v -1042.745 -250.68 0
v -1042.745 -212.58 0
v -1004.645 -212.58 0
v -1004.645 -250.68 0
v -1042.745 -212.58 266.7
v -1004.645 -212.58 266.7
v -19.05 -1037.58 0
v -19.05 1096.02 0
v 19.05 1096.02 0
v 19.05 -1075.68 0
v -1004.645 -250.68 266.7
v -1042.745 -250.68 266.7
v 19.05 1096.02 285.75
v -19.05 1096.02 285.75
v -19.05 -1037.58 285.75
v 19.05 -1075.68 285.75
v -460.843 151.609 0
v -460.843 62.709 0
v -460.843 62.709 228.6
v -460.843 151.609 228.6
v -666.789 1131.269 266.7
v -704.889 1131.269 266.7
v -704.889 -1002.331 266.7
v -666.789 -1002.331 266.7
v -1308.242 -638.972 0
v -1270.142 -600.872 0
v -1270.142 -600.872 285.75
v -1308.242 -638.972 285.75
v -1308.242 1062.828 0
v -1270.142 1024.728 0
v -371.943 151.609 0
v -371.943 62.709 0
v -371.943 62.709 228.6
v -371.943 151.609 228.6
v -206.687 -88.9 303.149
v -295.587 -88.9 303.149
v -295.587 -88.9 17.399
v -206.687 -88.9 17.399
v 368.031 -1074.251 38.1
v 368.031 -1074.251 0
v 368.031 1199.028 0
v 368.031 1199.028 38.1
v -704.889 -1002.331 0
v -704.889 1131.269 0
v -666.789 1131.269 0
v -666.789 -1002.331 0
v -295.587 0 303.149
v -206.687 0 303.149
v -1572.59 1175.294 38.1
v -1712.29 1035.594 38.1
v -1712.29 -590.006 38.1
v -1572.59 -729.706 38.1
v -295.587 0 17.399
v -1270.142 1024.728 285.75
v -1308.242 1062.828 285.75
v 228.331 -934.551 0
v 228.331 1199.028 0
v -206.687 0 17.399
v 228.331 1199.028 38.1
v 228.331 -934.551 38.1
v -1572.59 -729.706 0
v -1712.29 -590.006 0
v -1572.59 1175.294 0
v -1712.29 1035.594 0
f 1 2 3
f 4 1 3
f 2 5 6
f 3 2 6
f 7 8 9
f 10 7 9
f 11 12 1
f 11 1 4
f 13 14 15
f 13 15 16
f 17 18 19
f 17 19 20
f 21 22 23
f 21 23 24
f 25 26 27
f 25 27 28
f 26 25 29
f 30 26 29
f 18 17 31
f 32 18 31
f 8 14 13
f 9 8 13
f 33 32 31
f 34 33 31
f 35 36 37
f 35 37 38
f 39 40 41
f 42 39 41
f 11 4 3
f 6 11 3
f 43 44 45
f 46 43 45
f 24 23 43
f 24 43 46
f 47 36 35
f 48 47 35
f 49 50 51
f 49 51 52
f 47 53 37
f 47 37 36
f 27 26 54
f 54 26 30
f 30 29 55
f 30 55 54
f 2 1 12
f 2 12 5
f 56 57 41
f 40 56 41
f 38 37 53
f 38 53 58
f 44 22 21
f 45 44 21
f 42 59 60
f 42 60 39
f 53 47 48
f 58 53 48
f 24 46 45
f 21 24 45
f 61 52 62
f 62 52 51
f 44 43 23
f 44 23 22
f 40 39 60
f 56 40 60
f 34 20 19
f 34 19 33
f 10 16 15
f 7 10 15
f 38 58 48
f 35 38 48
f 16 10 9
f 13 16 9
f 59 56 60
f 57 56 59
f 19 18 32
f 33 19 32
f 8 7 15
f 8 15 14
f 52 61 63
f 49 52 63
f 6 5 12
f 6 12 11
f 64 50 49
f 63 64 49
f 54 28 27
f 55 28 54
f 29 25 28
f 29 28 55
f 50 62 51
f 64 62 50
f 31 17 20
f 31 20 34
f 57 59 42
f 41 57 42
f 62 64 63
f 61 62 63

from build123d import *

# Parameters (mm, degrees)
F0_W      = 38.1
F0_H      = 2209.8
F1_DEPTH  = 285.75
F3_DEPTH  = 285.751
F4_W      = 38.1
F4_H      = 1701.8
F5_DEPTH  = 285.75
F7_DEPTH  = 285.751
F9_DEPTH  = 285.751
F10_W     = 38.1
F10_H     = 2133.6
F11_DEPTH = 266.7
F12_W     = 38.1
F12_H     = 38.1
F13_DEPTH = 266.7
F14_W     = 88.9
F14_H     = 88.9
F15_DEPTH = 228.6
F16_W     = 139.7
F16_H     = 2311.4
F17_DEPTH = 38.1
F19_DEPTH = 38.101
F20_W     = 139.7
F20_H     = 1905
F21_DEPTH = 38.1
F23_DEPTH = 38.101
F25_DEPTH = 38.101
F26_W     = 88.9
F26_H     = 285.75
F27_DEPTH = 88.9
F29_DEPTH = 285.751
F31_DEPTH = 285.751
F32_W     = 139.7
F32_H     = 38.121408
F33_DEPTH = 38.101


with BuildPart() as f1:
    # F0 (on Top) → F1 (new body)
    with BuildSketch(Plane.XY):
        with Locations((0, 29.220348)):
            Rectangle(F0_W, F0_H)
    extrude(amount=F1_DEPTH)

    # F2 (on face) → F3 (cut, through all)
    with BuildSketch(Plane.XY.offset(285.75)):
        Polygon((-19.05, -1075.679652), (19.05, -1075.679652), (-19.05, -1037.579652), align=None)
    extrude(amount=-F3_DEPTH, mode=Mode.SUBTRACT)

    # F28 (on face) → F29 (cut, through all)
    with BuildSketch(Plane.XY.offset(285.75)):
        Polygon((19.05, 1134.120348), (-19.05, 1134.120348), (-19.05, 1096.020348), align=None)
    extrude(amount=-F29_DEPTH, mode=Mode.SUBTRACT)

    # F30 (on face) → F31 (cut, through all)
    with BuildSketch(Plane.XY.offset(285.75)):
        Polygon((19.05, 1096.020348), (19.05, 1134.120348), (-19.05, 1096.020348), align=None)
    extrude(amount=-F31_DEPTH, mode=Mode.SUBTRACT)


with BuildPart() as f5:
    # F4 (on Top) → F5 (new body)
    with BuildSketch(Plane.XY):
        with Locations((-1289.192454, 211.927569)):
            Rectangle(F4_W, F4_H)
    extrude(amount=F5_DEPTH)

    # F6 (on face) → F7 (cut, through all)
    with BuildSketch(Plane.XY.offset(285.75)):
        Polygon((-1270.142454, 1024.727569), (-1270.142454, 1062.827569), (-1308.242454, 1062.827569), align=None)
    extrude(amount=-F7_DEPTH, mode=Mode.SUBTRACT)

    # F8 (on face) → F9 (cut, through all)
    with BuildSketch(Plane.XY.offset(285.75)):
        Polygon((-1270.142454, -600.872431), (-1308.242454, -638.972431), (-1270.142454, -638.972431), align=None)
    extrude(amount=-F9_DEPTH, mode=Mode.SUBTRACT)


with BuildPart() as f11:
    # F10 (on Top) → F11 (new body)
    with BuildSketch(Plane.XY):
        with Locations((-685.839234, 64.468862)):
            Rectangle(F10_W, F10_H)
    extrude(amount=F11_DEPTH)


with BuildPart() as f13:
    # F12 (on Top) → F13 (new body)
    with BuildSketch(Plane.XY):
        with Locations((-1023.695287, -231.63034)):
            Rectangle(F12_W, F12_H)
    extrude(amount=F13_DEPTH)


with BuildPart() as f15:
    # F14 (on Top) → F15 (new body)
    with BuildSketch(Plane.XY):
        with Locations((-416.393369, 107.158791)):
            Rectangle(F14_W, F14_H)
    extrude(amount=F15_DEPTH)


with BuildPart() as f17:
    # F16 (on Top) → F17 (new body)
    with BuildSketch(Plane.XY):
        with Locations((298.18053, 81.449066)):
            Rectangle(F16_W, F16_H)
    extrude(amount=F17_DEPTH)

    # F18 (on face) → F19 (cut, through all)
    with BuildSketch(Plane.XY.offset(38.1)):
        Polygon((228.33053, -934.550934), (228.33053, -1074.250934), (368.03053, -1074.250934), align=None)
    extrude(amount=-F19_DEPTH, mode=Mode.SUBTRACT)

    # F32 (on face) → F33 (cut, through all)
    with BuildSketch(Plane.XY.offset(38.1)):
        with Locations((298.18053, 1218.088362)):
            Rectangle(F32_W, F32_H)
    extrude(amount=-F33_DEPTH, mode=Mode.SUBTRACT)


with BuildPart() as f21:
    # F20 (on Top) → F21 (new body)
    with BuildSketch(Plane.XY):
        with Locations((-1642.440043, 222.794294)):
            Rectangle(F20_W, F20_H)
    extrude(amount=F21_DEPTH)

    # F22 (on face) → F23 (cut, through all)
    with BuildSketch(Plane.XY.offset(38.1)):
        Polygon((-1712.290043, 1035.594294), (-1572.590043, 1175.294294), (-1712.290043, 1175.294294), align=None)
    extrude(amount=-F23_DEPTH, mode=Mode.SUBTRACT)

    # F24 (on face) → F25 (cut, through all)
    with BuildSketch(Plane.XY.offset(38.1)):
        Polygon((-1712.290043, -729.705706), (-1572.590043, -729.705706), (-1712.290043, -590.005706), align=None)
    extrude(amount=-F25_DEPTH, mode=Mode.SUBTRACT)


with BuildPart() as f27:
    # F26 (on Front) → F27 (new body)
    with BuildSketch(Plane.XZ):
        with Locations((-251.136882, 160.274221)):
            Rectangle(F26_W, F26_H)
    extrude(amount=F27_DEPTH)


solid = Compound([f1.part, f5.part, f11.part, f13.part, f15.part, f17.part, f21.part, f27.part])
